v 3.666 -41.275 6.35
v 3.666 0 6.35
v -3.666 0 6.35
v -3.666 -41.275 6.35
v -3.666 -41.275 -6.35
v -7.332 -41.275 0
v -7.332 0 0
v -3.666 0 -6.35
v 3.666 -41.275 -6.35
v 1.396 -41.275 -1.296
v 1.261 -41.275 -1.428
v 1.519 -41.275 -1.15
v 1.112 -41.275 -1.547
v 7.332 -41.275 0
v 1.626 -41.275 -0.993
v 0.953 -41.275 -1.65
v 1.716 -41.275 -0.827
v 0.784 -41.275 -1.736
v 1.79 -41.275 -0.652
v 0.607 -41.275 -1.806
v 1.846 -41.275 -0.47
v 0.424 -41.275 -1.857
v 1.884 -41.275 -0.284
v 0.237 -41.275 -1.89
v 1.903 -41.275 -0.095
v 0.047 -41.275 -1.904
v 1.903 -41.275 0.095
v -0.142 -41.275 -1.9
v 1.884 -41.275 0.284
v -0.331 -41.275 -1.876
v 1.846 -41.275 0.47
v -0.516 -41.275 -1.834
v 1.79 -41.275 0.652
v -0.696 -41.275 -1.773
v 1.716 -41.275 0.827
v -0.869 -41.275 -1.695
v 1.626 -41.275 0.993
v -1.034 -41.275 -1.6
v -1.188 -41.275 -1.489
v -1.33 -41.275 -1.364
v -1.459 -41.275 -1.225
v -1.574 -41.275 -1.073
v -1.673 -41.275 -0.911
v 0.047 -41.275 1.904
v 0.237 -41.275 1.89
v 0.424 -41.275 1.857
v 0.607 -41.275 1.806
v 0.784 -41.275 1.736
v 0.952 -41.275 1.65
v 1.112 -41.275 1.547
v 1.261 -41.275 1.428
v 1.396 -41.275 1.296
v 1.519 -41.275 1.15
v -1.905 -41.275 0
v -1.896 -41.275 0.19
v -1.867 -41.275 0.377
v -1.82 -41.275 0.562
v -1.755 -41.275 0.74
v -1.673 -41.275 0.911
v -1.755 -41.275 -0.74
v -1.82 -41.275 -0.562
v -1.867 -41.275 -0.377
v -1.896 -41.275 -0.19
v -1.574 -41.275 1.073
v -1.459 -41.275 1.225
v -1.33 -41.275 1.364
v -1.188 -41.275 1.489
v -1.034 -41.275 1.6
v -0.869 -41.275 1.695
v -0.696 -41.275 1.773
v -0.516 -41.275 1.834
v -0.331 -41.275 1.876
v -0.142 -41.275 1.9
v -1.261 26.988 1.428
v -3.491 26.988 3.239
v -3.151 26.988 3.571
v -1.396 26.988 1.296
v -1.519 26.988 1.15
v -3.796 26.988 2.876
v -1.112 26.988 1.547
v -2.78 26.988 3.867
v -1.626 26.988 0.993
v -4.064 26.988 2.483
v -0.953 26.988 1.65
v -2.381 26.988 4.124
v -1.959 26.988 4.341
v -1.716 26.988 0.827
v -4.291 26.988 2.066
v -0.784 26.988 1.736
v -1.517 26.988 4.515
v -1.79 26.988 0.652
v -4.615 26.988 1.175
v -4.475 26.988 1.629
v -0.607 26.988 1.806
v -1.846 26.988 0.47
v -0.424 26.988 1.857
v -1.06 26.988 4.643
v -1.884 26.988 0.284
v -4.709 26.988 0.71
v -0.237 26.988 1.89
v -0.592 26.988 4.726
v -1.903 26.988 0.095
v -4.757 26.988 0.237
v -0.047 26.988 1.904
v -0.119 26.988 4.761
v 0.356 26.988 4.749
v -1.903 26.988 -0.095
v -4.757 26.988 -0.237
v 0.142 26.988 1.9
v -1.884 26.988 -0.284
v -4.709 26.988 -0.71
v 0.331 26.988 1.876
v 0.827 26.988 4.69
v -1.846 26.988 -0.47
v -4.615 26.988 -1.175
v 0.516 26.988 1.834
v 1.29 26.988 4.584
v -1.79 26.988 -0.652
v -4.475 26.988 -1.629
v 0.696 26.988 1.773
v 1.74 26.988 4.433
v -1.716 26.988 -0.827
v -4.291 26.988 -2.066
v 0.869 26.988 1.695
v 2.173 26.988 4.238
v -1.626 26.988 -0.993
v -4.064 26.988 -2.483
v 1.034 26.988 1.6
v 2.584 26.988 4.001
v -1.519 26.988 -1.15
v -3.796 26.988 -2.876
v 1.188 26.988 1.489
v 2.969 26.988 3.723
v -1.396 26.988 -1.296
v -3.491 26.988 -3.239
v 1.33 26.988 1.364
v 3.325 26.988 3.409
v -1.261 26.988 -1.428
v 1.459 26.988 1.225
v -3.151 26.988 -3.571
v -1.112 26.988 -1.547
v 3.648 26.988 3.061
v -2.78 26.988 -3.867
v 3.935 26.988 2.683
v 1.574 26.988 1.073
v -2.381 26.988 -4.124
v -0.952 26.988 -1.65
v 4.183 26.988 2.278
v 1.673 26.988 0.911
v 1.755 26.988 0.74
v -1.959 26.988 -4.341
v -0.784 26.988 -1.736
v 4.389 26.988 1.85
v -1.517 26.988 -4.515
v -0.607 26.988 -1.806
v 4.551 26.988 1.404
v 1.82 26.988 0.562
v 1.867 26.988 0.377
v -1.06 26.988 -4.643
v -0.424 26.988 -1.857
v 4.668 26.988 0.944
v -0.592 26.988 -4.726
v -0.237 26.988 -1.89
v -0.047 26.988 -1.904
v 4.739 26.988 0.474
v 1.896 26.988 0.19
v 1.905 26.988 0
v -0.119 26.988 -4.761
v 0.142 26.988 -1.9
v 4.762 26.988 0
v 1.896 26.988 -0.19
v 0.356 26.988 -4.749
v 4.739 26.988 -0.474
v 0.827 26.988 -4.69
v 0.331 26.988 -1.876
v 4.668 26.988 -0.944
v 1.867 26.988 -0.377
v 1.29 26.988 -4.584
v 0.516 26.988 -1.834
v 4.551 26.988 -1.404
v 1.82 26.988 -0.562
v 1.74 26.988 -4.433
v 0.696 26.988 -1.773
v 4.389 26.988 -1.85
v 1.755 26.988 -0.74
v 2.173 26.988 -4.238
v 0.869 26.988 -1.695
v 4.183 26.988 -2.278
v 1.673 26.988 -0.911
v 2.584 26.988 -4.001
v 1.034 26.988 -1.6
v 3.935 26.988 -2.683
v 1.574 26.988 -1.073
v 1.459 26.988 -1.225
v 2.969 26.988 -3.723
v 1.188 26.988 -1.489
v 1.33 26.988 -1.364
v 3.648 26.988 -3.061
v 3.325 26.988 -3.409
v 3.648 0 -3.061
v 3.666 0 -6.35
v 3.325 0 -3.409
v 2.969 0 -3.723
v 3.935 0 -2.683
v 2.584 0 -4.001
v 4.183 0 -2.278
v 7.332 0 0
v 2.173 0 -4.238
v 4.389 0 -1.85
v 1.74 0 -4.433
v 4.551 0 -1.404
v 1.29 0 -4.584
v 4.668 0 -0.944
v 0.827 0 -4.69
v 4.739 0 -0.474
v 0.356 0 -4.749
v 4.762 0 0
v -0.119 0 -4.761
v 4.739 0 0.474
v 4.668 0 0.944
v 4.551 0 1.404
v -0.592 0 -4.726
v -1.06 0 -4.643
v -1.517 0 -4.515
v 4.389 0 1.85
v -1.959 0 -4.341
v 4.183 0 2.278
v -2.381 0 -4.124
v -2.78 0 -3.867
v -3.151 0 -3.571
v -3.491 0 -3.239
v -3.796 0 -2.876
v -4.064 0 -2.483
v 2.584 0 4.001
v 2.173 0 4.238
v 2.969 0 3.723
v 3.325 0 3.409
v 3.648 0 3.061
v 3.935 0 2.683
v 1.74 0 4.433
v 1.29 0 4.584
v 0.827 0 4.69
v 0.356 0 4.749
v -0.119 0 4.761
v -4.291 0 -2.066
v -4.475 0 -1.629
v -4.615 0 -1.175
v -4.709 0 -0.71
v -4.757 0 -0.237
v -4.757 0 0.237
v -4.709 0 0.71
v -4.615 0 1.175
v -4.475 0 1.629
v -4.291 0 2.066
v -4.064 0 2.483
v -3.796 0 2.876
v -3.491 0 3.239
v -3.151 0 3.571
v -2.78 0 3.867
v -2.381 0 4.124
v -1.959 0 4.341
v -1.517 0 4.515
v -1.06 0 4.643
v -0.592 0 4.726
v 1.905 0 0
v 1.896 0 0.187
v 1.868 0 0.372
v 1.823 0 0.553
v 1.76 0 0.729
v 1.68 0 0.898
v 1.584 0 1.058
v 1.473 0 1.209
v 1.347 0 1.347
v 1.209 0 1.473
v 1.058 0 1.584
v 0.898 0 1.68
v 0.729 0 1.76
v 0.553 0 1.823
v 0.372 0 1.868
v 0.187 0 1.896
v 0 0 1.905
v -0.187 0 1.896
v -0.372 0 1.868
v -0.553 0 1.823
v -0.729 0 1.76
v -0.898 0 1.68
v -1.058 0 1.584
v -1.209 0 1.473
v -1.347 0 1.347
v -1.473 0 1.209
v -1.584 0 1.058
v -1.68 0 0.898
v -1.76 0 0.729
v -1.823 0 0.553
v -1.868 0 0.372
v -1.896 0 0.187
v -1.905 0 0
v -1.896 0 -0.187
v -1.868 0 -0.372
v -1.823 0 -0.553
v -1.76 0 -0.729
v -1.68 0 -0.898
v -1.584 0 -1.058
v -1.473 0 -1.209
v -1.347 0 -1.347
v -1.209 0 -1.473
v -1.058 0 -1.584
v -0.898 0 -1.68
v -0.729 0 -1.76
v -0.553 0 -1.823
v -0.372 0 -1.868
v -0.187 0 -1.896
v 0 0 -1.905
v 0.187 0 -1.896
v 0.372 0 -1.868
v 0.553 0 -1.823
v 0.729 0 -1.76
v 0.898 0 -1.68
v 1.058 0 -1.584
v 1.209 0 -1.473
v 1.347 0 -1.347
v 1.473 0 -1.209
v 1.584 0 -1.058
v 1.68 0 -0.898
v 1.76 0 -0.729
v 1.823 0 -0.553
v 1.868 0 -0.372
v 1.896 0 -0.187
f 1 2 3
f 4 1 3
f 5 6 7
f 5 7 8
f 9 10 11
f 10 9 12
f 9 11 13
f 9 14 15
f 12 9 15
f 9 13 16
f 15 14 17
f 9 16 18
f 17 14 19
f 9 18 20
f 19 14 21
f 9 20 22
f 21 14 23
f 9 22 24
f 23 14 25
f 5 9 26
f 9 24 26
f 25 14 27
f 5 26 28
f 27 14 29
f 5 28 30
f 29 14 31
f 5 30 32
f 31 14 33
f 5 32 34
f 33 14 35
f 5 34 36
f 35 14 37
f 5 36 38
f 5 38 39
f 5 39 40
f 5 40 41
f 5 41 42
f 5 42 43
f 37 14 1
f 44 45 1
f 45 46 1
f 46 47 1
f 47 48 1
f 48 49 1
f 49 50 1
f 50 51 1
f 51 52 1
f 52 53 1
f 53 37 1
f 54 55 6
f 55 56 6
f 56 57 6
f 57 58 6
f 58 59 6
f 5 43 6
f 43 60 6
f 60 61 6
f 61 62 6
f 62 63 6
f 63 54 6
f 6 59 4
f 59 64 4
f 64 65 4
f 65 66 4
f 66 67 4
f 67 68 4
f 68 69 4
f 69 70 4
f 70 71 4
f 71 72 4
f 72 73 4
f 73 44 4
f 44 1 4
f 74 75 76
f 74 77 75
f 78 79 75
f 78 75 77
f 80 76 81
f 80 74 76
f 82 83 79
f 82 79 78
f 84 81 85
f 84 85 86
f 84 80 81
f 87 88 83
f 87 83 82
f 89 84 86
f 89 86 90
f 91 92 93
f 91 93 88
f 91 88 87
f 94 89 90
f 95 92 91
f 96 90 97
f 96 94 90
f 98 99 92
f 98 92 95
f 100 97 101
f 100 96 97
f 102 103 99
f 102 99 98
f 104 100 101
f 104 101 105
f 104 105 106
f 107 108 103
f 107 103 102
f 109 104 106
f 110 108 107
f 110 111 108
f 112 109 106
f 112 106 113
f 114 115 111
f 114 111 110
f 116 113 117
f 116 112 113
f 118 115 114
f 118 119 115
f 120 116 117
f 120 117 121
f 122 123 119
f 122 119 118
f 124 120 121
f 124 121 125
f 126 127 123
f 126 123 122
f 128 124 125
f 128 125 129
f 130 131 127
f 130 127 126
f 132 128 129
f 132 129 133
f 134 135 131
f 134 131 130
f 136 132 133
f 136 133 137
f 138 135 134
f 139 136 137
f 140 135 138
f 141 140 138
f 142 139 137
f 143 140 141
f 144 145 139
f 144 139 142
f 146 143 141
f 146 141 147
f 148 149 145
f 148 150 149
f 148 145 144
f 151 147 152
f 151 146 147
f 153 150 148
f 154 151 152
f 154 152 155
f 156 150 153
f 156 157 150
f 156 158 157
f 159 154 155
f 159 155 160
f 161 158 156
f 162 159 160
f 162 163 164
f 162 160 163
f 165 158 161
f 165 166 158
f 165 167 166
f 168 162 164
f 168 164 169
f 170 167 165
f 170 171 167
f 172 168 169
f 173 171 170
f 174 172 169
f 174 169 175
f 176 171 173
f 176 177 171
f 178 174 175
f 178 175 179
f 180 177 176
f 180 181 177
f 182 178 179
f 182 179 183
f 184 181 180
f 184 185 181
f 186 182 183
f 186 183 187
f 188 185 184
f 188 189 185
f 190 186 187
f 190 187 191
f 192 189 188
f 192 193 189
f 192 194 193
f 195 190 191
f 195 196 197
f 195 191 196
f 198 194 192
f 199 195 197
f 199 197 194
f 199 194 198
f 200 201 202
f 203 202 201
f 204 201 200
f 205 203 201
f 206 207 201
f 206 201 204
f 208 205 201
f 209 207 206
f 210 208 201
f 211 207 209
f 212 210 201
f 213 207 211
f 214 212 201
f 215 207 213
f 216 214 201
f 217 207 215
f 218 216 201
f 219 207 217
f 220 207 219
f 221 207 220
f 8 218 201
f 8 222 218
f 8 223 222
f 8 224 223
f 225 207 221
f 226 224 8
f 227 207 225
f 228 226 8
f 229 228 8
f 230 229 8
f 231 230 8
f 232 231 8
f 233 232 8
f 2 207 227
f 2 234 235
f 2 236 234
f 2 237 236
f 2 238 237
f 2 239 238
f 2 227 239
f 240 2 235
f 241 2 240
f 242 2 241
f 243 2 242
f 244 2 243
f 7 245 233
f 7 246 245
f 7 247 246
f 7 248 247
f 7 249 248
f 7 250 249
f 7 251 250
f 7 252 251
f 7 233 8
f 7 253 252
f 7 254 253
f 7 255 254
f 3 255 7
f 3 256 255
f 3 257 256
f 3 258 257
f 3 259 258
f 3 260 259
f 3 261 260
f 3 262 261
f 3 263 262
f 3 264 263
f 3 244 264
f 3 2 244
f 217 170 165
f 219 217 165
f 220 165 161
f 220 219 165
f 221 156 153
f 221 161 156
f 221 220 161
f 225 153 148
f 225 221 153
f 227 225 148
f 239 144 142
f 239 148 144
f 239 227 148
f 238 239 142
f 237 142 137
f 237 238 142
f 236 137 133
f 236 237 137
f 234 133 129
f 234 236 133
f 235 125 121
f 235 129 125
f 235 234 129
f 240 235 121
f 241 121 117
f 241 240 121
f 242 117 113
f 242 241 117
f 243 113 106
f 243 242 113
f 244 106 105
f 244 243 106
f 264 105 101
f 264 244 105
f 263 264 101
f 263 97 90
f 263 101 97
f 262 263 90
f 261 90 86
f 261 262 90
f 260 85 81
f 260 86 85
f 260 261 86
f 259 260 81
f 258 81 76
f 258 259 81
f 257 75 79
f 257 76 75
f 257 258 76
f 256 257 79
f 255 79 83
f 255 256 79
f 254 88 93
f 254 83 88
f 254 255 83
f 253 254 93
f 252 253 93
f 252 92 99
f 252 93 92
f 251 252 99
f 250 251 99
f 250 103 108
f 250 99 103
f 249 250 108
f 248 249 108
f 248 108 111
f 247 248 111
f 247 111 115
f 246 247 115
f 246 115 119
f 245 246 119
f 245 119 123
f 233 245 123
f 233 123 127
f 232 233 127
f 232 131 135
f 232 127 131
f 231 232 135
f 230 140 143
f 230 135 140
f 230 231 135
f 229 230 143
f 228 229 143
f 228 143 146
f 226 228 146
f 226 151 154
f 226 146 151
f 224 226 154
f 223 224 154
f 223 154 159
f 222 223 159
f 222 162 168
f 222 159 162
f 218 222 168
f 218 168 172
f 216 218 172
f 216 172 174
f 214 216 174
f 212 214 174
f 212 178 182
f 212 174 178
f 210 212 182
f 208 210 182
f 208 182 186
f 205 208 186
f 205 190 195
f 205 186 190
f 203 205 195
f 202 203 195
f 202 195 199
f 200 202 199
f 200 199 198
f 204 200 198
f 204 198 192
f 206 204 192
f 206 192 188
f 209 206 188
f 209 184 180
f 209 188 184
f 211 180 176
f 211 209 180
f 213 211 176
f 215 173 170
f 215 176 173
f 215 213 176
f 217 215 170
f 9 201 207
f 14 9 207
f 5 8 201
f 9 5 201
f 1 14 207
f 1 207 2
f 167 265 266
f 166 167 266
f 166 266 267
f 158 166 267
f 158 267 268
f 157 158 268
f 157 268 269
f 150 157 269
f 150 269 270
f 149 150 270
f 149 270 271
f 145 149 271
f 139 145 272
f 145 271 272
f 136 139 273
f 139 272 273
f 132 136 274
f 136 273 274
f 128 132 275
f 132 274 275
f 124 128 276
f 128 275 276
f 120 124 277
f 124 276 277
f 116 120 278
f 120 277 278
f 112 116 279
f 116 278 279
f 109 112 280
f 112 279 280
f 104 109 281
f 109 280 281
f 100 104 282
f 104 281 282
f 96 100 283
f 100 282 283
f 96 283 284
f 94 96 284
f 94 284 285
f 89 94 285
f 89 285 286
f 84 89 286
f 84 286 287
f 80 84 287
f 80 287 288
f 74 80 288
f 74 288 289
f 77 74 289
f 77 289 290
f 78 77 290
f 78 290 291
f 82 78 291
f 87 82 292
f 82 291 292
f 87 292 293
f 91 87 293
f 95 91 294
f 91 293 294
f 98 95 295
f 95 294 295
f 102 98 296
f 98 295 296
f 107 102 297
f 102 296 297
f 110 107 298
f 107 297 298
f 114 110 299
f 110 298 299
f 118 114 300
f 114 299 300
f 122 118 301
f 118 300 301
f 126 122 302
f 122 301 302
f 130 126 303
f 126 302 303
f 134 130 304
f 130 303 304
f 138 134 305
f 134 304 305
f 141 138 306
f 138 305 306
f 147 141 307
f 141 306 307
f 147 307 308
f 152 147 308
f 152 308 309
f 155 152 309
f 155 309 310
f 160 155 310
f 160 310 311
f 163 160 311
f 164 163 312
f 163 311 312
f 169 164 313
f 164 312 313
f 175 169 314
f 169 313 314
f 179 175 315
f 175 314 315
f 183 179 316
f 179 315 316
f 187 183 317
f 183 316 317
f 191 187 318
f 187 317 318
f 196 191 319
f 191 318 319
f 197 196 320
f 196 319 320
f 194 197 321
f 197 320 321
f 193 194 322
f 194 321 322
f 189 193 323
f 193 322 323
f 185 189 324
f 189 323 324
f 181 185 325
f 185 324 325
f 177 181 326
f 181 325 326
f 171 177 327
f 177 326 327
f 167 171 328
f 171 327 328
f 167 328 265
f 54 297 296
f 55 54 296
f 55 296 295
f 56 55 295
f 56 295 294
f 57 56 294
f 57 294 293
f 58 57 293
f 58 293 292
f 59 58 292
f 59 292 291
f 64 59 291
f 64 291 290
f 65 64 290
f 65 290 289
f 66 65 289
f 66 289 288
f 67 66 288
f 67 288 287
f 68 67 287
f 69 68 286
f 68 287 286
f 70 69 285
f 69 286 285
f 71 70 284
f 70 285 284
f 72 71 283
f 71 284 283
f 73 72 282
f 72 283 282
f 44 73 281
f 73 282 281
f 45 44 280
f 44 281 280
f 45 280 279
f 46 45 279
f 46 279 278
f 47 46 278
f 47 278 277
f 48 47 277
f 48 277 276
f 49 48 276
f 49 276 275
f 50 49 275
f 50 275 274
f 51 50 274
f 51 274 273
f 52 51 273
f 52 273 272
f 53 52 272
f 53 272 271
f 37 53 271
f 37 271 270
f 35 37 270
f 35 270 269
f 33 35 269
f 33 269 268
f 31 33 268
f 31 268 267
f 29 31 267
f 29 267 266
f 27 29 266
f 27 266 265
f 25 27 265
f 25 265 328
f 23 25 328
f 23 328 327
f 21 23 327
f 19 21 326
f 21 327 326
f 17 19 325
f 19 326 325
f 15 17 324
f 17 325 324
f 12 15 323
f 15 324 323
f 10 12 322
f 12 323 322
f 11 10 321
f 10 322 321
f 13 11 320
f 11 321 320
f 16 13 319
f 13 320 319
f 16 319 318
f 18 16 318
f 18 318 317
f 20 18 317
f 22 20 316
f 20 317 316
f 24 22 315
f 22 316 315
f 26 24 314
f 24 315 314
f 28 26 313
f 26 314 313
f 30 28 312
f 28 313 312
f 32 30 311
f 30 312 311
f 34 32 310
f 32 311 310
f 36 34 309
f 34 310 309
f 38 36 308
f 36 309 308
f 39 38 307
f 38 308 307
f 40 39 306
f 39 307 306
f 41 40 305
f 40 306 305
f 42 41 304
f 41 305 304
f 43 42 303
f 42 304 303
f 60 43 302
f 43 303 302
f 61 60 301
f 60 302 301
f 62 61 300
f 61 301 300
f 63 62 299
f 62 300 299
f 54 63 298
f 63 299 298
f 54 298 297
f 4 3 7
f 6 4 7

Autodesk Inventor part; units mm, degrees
ref_plane "YZ Plane" through (0, 0, 0) normal (1, 0, 0) x (0, 1, 0)
ref_plane "XZ Plane" through (0, 0, 0) normal (0, 1, 0) x (-1, 0, 0)
ref_plane "XY Plane" through (0, 0, 0) normal (0, 0, 1) x (1, 0, 0)
sketch "Sketch1" plane through (0, 0, 0) normal (0, 1, 0) x (-1, 0, 0)
  line L0 (3.6662, -6.35) -> (-3.6662, -6.35)
  line L1 (-3.6662, -6.35) -> (-7.3323, 0)
  line L2 (-7.3323, 0) -> (-3.6662, 6.35)
  line L3 (-3.6662, 6.35) -> (3.6662, 6.35)
  line L4 (3.6662, 6.35) -> (7.3323, 0)
  line L5 (7.3323, 0) -> (3.6662, -6.35)
  circle A0 centre (0, 0) radius 1.905
  dimension "d0" = 12.7
  dimension "d6" = 3.81
extrude "Extrusion1" add sketch "Sketch1" against normal blind 41.275
sketch "Sketch2" plane through (0, 0, 0) normal (0, 1, 0) x (1, 0, 0)
  circle A0 centre (0, 0) radius 4.7625
  circle A1 centre (0, 0) radius 1.905 projected
  dimension "d3" = 9.525
extrude "Extrusion2" add sketch "Sketch2" along normal blind 26.9875
properties part number "Roller shaft"
